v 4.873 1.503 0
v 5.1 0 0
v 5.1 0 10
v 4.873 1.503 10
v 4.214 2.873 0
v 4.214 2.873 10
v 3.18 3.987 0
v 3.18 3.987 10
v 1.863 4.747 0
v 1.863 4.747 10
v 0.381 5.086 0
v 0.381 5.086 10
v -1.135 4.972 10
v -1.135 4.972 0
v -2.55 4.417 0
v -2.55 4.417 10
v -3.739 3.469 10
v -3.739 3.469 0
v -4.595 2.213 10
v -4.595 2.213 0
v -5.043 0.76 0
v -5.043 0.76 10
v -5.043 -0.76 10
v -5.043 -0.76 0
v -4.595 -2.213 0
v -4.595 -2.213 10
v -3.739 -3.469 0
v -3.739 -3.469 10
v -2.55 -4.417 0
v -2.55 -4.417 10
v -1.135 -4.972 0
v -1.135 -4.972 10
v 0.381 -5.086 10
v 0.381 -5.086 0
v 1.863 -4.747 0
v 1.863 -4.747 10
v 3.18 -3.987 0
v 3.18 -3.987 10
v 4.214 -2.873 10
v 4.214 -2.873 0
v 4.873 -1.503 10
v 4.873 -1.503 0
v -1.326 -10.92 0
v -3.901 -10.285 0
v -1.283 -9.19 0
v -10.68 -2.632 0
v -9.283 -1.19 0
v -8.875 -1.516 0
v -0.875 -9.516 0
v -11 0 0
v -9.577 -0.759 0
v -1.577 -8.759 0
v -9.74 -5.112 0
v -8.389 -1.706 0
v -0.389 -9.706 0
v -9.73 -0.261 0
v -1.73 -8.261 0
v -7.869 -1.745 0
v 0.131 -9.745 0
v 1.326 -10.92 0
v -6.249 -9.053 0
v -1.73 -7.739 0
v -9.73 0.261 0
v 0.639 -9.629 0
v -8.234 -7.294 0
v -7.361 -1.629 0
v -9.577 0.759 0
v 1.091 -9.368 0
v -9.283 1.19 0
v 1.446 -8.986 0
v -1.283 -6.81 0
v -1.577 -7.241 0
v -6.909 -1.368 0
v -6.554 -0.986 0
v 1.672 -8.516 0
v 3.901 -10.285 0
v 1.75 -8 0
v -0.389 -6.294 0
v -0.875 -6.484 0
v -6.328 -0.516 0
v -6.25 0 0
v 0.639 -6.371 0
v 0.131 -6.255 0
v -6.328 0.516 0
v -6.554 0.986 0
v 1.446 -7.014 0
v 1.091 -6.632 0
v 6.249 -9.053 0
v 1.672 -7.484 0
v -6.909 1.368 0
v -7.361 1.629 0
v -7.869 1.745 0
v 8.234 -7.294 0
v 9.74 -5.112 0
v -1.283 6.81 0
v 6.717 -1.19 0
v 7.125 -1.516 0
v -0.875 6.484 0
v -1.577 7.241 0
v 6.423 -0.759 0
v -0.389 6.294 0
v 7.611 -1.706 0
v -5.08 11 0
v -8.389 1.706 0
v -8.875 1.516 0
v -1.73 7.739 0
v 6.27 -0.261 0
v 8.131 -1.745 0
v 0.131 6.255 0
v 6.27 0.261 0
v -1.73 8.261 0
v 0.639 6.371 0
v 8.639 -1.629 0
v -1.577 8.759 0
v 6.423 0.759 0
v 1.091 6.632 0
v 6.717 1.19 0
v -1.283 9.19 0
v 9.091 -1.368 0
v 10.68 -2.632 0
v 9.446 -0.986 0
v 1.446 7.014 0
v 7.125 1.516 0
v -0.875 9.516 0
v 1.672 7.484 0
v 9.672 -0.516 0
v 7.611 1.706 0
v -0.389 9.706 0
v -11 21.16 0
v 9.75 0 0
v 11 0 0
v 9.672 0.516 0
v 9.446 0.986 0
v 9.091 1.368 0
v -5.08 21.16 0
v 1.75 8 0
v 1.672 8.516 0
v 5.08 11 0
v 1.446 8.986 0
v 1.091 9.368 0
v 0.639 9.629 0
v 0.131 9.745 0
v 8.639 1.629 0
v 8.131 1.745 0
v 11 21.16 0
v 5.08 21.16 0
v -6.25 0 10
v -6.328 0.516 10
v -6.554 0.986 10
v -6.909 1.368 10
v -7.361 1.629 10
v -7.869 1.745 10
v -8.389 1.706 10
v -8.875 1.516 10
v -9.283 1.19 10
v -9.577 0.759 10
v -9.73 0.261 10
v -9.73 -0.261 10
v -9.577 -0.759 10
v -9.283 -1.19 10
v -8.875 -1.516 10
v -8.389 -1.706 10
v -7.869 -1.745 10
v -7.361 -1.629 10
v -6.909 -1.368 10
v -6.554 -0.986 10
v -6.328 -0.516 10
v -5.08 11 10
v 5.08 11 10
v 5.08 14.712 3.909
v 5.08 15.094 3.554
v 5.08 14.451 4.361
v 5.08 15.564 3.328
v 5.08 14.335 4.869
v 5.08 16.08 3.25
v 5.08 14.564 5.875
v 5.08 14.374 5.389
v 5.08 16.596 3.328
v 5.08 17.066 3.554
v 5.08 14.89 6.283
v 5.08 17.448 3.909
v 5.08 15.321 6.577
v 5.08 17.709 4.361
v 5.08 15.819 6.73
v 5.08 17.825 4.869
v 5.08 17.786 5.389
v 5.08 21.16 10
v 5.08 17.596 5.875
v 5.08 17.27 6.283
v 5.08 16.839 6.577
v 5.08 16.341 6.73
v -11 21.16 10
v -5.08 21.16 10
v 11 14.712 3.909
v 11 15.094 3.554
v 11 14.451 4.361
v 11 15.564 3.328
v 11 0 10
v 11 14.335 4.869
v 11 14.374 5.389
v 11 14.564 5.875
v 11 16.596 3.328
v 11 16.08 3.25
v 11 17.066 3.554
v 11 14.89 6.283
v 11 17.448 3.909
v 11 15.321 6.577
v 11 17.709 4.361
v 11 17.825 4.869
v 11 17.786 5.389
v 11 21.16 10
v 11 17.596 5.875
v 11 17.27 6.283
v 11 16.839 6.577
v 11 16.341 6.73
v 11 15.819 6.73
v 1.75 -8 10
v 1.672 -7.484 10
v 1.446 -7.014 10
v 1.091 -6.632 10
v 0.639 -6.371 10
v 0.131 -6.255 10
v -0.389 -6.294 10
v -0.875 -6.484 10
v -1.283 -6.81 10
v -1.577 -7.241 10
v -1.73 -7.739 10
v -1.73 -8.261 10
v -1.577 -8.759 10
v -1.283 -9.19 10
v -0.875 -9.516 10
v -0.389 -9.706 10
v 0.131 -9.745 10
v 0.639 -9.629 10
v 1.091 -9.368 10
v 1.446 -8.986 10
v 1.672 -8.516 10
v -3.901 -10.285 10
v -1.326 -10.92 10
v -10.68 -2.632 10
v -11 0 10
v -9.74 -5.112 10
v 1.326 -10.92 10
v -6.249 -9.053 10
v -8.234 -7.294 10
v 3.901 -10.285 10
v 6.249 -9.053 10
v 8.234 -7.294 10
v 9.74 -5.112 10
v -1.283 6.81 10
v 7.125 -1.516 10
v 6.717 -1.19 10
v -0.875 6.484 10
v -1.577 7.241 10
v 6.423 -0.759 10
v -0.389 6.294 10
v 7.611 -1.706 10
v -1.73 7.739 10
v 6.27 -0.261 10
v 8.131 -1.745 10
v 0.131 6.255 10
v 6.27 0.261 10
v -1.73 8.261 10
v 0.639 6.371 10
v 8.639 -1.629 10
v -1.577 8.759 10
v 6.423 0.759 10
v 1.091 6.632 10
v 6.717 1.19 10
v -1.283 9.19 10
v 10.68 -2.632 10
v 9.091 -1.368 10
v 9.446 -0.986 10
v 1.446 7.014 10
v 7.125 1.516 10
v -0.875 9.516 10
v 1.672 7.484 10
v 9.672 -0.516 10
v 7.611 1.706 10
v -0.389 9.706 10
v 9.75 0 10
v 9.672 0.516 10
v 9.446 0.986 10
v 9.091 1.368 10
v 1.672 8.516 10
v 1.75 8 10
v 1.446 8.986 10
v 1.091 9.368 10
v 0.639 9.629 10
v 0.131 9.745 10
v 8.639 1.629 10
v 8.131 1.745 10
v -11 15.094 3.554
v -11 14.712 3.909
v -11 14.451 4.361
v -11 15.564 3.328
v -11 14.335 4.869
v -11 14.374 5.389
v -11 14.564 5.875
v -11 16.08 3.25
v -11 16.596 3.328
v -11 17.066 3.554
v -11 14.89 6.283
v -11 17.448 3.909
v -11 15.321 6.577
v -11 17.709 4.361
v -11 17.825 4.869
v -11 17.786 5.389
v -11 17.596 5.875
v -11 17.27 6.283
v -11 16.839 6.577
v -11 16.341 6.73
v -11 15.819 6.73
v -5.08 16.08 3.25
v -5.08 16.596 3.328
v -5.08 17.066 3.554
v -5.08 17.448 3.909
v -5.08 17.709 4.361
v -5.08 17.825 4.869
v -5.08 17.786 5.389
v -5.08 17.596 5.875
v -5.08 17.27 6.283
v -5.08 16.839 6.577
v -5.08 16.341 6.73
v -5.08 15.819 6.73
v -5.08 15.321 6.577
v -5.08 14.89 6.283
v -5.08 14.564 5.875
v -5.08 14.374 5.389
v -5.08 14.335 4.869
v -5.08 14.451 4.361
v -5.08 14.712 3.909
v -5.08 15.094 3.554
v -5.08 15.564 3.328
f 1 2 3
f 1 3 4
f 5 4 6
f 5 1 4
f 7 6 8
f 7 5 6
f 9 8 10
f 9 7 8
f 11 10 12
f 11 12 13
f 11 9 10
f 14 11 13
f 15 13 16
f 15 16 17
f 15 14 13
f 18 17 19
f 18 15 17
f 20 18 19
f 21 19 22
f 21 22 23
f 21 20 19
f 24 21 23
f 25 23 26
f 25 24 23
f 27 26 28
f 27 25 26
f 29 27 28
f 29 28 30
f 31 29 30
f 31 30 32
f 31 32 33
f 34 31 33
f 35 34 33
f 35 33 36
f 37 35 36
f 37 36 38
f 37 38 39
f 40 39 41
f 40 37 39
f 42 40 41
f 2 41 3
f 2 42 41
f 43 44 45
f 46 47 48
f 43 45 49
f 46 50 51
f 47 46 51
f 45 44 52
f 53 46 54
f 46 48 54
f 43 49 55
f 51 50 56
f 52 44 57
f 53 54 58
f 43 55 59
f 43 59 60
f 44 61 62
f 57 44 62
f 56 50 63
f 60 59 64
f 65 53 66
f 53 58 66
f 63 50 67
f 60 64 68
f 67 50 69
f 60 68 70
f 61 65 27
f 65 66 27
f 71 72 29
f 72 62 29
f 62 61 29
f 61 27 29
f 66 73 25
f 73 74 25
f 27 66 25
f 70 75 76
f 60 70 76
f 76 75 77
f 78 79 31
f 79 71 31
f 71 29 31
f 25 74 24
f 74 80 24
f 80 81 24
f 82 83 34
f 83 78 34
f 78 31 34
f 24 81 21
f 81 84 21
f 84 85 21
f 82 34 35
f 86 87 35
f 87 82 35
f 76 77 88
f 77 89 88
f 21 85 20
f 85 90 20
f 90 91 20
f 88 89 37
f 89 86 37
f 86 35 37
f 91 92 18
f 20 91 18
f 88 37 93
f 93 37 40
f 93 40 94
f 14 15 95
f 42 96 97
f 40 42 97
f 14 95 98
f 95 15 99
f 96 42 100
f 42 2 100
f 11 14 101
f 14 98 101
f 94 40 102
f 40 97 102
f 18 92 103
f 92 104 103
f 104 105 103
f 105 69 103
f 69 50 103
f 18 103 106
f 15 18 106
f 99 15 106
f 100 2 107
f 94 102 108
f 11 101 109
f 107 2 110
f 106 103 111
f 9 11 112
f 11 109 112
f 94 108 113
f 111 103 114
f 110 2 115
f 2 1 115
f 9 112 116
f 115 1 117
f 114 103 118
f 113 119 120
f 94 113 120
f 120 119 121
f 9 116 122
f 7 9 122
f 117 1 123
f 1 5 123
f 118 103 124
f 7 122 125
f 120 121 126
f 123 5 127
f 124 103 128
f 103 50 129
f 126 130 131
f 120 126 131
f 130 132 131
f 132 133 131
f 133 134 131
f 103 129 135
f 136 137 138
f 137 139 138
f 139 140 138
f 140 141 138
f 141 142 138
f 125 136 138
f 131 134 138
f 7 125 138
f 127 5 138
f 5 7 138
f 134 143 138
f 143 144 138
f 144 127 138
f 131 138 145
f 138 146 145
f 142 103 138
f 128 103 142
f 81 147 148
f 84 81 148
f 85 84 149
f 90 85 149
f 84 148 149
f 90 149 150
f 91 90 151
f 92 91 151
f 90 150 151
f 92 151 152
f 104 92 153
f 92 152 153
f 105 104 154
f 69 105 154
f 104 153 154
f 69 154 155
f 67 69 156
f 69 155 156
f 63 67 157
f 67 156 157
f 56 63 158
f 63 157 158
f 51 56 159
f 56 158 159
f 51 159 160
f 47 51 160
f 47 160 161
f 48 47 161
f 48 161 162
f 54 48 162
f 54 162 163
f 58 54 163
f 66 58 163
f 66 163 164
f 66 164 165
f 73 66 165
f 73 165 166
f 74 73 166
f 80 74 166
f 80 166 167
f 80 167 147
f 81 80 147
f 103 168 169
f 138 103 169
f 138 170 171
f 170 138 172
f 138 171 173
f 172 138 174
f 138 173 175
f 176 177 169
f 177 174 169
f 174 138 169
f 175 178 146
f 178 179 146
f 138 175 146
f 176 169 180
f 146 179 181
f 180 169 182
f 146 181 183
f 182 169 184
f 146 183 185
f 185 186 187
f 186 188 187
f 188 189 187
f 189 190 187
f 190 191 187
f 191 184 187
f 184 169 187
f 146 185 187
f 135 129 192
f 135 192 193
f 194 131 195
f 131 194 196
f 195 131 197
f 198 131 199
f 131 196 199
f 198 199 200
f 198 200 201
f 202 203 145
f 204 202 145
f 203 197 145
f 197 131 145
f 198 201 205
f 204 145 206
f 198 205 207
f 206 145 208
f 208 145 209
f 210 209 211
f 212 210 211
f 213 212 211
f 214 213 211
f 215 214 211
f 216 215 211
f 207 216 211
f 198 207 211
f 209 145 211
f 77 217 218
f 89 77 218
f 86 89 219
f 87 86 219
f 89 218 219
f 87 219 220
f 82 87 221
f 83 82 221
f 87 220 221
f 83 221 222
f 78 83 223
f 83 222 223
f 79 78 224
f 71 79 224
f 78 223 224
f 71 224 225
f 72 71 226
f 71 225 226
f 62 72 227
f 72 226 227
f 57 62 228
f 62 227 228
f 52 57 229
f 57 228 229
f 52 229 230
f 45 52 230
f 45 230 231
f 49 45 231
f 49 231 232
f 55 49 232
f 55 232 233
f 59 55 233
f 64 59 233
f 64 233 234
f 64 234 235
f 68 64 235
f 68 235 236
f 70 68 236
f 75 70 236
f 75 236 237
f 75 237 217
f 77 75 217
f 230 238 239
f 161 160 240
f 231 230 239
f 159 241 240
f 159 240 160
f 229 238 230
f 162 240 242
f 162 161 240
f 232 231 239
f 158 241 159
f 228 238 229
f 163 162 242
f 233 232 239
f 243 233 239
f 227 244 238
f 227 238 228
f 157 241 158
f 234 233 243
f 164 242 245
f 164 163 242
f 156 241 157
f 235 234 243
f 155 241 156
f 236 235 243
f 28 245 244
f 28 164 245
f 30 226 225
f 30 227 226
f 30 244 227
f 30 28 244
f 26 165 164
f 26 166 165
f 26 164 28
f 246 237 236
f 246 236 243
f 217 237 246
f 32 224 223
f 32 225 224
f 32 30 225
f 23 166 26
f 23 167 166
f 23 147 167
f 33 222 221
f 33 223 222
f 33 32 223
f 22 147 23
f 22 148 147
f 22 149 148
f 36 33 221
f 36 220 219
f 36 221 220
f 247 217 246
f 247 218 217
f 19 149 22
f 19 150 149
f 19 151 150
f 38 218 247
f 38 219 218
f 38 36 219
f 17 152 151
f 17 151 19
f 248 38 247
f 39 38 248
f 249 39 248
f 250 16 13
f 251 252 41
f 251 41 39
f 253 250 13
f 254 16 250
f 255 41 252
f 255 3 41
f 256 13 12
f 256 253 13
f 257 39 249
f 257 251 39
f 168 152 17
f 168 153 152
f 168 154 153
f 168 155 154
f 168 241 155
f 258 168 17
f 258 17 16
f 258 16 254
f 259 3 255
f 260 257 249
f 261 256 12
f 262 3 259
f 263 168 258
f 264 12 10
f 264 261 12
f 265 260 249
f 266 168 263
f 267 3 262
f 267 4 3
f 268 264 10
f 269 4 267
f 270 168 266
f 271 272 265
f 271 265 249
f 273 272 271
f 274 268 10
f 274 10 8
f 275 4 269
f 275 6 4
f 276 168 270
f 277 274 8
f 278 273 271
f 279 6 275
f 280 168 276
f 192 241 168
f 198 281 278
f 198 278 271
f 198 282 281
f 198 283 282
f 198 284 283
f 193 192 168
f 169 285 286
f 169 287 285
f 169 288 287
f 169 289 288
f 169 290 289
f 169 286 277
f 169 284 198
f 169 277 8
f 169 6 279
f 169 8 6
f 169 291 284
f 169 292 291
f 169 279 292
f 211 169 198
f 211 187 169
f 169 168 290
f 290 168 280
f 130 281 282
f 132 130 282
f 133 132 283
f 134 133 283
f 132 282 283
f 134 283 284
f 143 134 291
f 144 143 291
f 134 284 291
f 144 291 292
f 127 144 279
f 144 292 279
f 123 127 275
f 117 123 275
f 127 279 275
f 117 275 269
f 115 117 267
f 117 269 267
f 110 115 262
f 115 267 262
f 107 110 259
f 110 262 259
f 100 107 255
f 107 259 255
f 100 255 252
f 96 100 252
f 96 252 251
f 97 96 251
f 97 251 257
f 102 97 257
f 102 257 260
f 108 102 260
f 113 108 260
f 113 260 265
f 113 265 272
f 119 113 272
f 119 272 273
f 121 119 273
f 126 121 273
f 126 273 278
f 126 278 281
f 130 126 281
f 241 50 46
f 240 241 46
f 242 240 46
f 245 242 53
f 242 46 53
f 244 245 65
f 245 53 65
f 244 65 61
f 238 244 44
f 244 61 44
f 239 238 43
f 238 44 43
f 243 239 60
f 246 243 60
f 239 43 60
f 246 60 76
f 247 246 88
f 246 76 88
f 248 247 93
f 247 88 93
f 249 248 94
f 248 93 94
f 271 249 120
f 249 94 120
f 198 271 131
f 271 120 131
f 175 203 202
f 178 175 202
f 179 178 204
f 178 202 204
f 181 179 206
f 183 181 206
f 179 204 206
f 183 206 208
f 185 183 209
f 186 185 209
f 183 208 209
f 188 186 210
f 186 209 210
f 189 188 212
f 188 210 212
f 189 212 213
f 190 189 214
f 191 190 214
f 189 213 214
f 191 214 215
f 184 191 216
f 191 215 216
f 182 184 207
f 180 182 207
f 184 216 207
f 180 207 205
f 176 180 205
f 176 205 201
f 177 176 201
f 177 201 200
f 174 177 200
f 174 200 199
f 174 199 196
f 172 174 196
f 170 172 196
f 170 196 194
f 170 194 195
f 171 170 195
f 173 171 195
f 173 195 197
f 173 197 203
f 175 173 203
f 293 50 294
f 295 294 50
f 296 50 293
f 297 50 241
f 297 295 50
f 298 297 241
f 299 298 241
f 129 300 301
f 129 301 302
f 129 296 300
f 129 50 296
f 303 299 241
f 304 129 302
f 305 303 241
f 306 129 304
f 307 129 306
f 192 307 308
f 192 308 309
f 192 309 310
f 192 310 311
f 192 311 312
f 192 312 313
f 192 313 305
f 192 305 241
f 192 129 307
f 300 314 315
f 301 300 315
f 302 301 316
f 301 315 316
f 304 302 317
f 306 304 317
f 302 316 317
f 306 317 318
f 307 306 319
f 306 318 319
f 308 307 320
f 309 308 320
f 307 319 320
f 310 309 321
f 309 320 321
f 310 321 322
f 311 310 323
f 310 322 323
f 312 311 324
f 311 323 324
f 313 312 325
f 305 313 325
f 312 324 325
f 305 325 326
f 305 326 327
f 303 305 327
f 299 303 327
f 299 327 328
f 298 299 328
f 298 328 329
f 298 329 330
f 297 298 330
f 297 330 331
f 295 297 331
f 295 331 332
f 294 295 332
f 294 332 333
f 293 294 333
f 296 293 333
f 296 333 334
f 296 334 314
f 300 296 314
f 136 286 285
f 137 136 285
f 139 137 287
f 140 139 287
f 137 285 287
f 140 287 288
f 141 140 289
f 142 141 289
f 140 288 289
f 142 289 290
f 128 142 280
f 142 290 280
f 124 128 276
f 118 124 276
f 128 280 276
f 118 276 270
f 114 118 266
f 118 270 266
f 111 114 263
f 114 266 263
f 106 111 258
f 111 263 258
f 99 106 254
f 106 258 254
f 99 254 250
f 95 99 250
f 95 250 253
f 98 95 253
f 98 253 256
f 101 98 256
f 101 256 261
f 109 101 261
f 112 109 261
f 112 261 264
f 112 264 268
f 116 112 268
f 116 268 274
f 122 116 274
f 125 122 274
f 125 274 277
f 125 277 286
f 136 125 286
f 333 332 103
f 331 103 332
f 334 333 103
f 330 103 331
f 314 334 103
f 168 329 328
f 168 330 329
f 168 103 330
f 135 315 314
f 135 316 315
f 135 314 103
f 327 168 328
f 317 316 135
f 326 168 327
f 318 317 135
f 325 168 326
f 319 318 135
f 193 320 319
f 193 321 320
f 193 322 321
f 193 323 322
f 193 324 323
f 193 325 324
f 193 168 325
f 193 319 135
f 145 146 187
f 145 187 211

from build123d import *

# Parameters (mm, degrees)
SKETCH1_R           = 11
SKETCH1_R_2         = 5.1
BOSS_EXTRUDE1_DEPTH = 10
SKETCH2_R           = 1.75
CUT_EXTRUDE1_DEPTH  = 19.493242009
BOSS_EXTRUDE2_START = 11
SKETCH3_W           = 22
SKETCH3_H           = 10
BOSS_EXTRUDE2_DEPTH = 10.16
BOSS_EXTRUDE3_REACH = 28.552
SKETCH5_W           = 22
SKETCH5_H           = 10
SKETCH6_W           = 10.16
SKETCH6_H           = 10.16
CUT_EXTRUDE2_DEPTH  = 26.860116009
SKETCH7_R           = 1.75
CUT_EXTRUDE3_DEPTH  = 33.120797001


with BuildPart() as part:
    # Sketch1 → Boss-Extrude1 (new body)
    with BuildSketch(Plane.XY):
        Circle(SKETCH1_R)
        Circle(SKETCH1_R_2, mode=Mode.SUBTRACT)
    extrude(amount=BOSS_EXTRUDE1_DEPTH)

    # Sketch2 → Cut-Extrude1 (cut, through all)
    with BuildSketch(Plane.XY.offset(10)):
        with Locations((0, 8)):
            Circle(SKETCH2_R)
        with Locations((8, 0)):
            Circle(SKETCH2_R)
        with Locations((0, -8)):
            Circle(SKETCH2_R)
        with Locations((-8, 0)):
            Circle(SKETCH2_R)
    extrude(amount=-CUT_EXTRUDE1_DEPTH, mode=Mode.SUBTRACT)

    # Sketch5 → Boss-Extrude3 (add, up to next)
    with BuildSketch(Plane.XZ.offset(-11), mode=Mode.PRIVATE) as boss_extrude3_sk1:
        with Locations((0, 5)):
            Rectangle(SKETCH5_W, SKETCH5_H)
    boss_extrude3_tool1 = extrude(boss_extrude3_sk1.sketch, amount=BOSS_EXTRUDE3_REACH, mode=Mode.PRIVATE) - part.part


with BuildPart() as body_2:
    # Sketch3 → Boss-Extrude2 (new body)
    with BuildSketch(Plane(origin=(0, 0, 0), x_dir=(1, 0, 0), z_dir=(0, 1, 0)).offset(BOSS_EXTRUDE2_START)):
        with Locations((0, -5)):
            Rectangle(SKETCH3_W, SKETCH3_H)
    extrude(amount=BOSS_EXTRUDE2_DEPTH)


with BuildPart() as part_1:
    add(part.part)

    add(body_2.part)  # Boss-Extrude3 merges body 2
    add(boss_extrude3_tool1.solids().sort_by_distance((0, 11, 5))[0])
    add(boss_extrude3_tool1.solids().sort_by_distance((0, 11, 5))[1])

    # Sketch6 → Cut-Extrude2 (cut, through all)
    with BuildSketch(Plane.XY.offset(10)):
        with Locations((0, 16.08)):
            Rectangle(SKETCH6_W, SKETCH6_H)
    extrude(amount=-CUT_EXTRUDE2_DEPTH, mode=Mode.SUBTRACT)

    # Sketch7 → Cut-Extrude3 (cut, through all)
    with BuildSketch(Plane(origin=(11, 0, 0), x_dir=(0, 0, -1), z_dir=(1, 0, 0))):
        with Locations((-5, 16.08)):
            Circle(SKETCH7_R)
    extrude(amount=-CUT_EXTRUDE3_DEPTH, mode=Mode.SUBTRACT)


solid = part_1.part
